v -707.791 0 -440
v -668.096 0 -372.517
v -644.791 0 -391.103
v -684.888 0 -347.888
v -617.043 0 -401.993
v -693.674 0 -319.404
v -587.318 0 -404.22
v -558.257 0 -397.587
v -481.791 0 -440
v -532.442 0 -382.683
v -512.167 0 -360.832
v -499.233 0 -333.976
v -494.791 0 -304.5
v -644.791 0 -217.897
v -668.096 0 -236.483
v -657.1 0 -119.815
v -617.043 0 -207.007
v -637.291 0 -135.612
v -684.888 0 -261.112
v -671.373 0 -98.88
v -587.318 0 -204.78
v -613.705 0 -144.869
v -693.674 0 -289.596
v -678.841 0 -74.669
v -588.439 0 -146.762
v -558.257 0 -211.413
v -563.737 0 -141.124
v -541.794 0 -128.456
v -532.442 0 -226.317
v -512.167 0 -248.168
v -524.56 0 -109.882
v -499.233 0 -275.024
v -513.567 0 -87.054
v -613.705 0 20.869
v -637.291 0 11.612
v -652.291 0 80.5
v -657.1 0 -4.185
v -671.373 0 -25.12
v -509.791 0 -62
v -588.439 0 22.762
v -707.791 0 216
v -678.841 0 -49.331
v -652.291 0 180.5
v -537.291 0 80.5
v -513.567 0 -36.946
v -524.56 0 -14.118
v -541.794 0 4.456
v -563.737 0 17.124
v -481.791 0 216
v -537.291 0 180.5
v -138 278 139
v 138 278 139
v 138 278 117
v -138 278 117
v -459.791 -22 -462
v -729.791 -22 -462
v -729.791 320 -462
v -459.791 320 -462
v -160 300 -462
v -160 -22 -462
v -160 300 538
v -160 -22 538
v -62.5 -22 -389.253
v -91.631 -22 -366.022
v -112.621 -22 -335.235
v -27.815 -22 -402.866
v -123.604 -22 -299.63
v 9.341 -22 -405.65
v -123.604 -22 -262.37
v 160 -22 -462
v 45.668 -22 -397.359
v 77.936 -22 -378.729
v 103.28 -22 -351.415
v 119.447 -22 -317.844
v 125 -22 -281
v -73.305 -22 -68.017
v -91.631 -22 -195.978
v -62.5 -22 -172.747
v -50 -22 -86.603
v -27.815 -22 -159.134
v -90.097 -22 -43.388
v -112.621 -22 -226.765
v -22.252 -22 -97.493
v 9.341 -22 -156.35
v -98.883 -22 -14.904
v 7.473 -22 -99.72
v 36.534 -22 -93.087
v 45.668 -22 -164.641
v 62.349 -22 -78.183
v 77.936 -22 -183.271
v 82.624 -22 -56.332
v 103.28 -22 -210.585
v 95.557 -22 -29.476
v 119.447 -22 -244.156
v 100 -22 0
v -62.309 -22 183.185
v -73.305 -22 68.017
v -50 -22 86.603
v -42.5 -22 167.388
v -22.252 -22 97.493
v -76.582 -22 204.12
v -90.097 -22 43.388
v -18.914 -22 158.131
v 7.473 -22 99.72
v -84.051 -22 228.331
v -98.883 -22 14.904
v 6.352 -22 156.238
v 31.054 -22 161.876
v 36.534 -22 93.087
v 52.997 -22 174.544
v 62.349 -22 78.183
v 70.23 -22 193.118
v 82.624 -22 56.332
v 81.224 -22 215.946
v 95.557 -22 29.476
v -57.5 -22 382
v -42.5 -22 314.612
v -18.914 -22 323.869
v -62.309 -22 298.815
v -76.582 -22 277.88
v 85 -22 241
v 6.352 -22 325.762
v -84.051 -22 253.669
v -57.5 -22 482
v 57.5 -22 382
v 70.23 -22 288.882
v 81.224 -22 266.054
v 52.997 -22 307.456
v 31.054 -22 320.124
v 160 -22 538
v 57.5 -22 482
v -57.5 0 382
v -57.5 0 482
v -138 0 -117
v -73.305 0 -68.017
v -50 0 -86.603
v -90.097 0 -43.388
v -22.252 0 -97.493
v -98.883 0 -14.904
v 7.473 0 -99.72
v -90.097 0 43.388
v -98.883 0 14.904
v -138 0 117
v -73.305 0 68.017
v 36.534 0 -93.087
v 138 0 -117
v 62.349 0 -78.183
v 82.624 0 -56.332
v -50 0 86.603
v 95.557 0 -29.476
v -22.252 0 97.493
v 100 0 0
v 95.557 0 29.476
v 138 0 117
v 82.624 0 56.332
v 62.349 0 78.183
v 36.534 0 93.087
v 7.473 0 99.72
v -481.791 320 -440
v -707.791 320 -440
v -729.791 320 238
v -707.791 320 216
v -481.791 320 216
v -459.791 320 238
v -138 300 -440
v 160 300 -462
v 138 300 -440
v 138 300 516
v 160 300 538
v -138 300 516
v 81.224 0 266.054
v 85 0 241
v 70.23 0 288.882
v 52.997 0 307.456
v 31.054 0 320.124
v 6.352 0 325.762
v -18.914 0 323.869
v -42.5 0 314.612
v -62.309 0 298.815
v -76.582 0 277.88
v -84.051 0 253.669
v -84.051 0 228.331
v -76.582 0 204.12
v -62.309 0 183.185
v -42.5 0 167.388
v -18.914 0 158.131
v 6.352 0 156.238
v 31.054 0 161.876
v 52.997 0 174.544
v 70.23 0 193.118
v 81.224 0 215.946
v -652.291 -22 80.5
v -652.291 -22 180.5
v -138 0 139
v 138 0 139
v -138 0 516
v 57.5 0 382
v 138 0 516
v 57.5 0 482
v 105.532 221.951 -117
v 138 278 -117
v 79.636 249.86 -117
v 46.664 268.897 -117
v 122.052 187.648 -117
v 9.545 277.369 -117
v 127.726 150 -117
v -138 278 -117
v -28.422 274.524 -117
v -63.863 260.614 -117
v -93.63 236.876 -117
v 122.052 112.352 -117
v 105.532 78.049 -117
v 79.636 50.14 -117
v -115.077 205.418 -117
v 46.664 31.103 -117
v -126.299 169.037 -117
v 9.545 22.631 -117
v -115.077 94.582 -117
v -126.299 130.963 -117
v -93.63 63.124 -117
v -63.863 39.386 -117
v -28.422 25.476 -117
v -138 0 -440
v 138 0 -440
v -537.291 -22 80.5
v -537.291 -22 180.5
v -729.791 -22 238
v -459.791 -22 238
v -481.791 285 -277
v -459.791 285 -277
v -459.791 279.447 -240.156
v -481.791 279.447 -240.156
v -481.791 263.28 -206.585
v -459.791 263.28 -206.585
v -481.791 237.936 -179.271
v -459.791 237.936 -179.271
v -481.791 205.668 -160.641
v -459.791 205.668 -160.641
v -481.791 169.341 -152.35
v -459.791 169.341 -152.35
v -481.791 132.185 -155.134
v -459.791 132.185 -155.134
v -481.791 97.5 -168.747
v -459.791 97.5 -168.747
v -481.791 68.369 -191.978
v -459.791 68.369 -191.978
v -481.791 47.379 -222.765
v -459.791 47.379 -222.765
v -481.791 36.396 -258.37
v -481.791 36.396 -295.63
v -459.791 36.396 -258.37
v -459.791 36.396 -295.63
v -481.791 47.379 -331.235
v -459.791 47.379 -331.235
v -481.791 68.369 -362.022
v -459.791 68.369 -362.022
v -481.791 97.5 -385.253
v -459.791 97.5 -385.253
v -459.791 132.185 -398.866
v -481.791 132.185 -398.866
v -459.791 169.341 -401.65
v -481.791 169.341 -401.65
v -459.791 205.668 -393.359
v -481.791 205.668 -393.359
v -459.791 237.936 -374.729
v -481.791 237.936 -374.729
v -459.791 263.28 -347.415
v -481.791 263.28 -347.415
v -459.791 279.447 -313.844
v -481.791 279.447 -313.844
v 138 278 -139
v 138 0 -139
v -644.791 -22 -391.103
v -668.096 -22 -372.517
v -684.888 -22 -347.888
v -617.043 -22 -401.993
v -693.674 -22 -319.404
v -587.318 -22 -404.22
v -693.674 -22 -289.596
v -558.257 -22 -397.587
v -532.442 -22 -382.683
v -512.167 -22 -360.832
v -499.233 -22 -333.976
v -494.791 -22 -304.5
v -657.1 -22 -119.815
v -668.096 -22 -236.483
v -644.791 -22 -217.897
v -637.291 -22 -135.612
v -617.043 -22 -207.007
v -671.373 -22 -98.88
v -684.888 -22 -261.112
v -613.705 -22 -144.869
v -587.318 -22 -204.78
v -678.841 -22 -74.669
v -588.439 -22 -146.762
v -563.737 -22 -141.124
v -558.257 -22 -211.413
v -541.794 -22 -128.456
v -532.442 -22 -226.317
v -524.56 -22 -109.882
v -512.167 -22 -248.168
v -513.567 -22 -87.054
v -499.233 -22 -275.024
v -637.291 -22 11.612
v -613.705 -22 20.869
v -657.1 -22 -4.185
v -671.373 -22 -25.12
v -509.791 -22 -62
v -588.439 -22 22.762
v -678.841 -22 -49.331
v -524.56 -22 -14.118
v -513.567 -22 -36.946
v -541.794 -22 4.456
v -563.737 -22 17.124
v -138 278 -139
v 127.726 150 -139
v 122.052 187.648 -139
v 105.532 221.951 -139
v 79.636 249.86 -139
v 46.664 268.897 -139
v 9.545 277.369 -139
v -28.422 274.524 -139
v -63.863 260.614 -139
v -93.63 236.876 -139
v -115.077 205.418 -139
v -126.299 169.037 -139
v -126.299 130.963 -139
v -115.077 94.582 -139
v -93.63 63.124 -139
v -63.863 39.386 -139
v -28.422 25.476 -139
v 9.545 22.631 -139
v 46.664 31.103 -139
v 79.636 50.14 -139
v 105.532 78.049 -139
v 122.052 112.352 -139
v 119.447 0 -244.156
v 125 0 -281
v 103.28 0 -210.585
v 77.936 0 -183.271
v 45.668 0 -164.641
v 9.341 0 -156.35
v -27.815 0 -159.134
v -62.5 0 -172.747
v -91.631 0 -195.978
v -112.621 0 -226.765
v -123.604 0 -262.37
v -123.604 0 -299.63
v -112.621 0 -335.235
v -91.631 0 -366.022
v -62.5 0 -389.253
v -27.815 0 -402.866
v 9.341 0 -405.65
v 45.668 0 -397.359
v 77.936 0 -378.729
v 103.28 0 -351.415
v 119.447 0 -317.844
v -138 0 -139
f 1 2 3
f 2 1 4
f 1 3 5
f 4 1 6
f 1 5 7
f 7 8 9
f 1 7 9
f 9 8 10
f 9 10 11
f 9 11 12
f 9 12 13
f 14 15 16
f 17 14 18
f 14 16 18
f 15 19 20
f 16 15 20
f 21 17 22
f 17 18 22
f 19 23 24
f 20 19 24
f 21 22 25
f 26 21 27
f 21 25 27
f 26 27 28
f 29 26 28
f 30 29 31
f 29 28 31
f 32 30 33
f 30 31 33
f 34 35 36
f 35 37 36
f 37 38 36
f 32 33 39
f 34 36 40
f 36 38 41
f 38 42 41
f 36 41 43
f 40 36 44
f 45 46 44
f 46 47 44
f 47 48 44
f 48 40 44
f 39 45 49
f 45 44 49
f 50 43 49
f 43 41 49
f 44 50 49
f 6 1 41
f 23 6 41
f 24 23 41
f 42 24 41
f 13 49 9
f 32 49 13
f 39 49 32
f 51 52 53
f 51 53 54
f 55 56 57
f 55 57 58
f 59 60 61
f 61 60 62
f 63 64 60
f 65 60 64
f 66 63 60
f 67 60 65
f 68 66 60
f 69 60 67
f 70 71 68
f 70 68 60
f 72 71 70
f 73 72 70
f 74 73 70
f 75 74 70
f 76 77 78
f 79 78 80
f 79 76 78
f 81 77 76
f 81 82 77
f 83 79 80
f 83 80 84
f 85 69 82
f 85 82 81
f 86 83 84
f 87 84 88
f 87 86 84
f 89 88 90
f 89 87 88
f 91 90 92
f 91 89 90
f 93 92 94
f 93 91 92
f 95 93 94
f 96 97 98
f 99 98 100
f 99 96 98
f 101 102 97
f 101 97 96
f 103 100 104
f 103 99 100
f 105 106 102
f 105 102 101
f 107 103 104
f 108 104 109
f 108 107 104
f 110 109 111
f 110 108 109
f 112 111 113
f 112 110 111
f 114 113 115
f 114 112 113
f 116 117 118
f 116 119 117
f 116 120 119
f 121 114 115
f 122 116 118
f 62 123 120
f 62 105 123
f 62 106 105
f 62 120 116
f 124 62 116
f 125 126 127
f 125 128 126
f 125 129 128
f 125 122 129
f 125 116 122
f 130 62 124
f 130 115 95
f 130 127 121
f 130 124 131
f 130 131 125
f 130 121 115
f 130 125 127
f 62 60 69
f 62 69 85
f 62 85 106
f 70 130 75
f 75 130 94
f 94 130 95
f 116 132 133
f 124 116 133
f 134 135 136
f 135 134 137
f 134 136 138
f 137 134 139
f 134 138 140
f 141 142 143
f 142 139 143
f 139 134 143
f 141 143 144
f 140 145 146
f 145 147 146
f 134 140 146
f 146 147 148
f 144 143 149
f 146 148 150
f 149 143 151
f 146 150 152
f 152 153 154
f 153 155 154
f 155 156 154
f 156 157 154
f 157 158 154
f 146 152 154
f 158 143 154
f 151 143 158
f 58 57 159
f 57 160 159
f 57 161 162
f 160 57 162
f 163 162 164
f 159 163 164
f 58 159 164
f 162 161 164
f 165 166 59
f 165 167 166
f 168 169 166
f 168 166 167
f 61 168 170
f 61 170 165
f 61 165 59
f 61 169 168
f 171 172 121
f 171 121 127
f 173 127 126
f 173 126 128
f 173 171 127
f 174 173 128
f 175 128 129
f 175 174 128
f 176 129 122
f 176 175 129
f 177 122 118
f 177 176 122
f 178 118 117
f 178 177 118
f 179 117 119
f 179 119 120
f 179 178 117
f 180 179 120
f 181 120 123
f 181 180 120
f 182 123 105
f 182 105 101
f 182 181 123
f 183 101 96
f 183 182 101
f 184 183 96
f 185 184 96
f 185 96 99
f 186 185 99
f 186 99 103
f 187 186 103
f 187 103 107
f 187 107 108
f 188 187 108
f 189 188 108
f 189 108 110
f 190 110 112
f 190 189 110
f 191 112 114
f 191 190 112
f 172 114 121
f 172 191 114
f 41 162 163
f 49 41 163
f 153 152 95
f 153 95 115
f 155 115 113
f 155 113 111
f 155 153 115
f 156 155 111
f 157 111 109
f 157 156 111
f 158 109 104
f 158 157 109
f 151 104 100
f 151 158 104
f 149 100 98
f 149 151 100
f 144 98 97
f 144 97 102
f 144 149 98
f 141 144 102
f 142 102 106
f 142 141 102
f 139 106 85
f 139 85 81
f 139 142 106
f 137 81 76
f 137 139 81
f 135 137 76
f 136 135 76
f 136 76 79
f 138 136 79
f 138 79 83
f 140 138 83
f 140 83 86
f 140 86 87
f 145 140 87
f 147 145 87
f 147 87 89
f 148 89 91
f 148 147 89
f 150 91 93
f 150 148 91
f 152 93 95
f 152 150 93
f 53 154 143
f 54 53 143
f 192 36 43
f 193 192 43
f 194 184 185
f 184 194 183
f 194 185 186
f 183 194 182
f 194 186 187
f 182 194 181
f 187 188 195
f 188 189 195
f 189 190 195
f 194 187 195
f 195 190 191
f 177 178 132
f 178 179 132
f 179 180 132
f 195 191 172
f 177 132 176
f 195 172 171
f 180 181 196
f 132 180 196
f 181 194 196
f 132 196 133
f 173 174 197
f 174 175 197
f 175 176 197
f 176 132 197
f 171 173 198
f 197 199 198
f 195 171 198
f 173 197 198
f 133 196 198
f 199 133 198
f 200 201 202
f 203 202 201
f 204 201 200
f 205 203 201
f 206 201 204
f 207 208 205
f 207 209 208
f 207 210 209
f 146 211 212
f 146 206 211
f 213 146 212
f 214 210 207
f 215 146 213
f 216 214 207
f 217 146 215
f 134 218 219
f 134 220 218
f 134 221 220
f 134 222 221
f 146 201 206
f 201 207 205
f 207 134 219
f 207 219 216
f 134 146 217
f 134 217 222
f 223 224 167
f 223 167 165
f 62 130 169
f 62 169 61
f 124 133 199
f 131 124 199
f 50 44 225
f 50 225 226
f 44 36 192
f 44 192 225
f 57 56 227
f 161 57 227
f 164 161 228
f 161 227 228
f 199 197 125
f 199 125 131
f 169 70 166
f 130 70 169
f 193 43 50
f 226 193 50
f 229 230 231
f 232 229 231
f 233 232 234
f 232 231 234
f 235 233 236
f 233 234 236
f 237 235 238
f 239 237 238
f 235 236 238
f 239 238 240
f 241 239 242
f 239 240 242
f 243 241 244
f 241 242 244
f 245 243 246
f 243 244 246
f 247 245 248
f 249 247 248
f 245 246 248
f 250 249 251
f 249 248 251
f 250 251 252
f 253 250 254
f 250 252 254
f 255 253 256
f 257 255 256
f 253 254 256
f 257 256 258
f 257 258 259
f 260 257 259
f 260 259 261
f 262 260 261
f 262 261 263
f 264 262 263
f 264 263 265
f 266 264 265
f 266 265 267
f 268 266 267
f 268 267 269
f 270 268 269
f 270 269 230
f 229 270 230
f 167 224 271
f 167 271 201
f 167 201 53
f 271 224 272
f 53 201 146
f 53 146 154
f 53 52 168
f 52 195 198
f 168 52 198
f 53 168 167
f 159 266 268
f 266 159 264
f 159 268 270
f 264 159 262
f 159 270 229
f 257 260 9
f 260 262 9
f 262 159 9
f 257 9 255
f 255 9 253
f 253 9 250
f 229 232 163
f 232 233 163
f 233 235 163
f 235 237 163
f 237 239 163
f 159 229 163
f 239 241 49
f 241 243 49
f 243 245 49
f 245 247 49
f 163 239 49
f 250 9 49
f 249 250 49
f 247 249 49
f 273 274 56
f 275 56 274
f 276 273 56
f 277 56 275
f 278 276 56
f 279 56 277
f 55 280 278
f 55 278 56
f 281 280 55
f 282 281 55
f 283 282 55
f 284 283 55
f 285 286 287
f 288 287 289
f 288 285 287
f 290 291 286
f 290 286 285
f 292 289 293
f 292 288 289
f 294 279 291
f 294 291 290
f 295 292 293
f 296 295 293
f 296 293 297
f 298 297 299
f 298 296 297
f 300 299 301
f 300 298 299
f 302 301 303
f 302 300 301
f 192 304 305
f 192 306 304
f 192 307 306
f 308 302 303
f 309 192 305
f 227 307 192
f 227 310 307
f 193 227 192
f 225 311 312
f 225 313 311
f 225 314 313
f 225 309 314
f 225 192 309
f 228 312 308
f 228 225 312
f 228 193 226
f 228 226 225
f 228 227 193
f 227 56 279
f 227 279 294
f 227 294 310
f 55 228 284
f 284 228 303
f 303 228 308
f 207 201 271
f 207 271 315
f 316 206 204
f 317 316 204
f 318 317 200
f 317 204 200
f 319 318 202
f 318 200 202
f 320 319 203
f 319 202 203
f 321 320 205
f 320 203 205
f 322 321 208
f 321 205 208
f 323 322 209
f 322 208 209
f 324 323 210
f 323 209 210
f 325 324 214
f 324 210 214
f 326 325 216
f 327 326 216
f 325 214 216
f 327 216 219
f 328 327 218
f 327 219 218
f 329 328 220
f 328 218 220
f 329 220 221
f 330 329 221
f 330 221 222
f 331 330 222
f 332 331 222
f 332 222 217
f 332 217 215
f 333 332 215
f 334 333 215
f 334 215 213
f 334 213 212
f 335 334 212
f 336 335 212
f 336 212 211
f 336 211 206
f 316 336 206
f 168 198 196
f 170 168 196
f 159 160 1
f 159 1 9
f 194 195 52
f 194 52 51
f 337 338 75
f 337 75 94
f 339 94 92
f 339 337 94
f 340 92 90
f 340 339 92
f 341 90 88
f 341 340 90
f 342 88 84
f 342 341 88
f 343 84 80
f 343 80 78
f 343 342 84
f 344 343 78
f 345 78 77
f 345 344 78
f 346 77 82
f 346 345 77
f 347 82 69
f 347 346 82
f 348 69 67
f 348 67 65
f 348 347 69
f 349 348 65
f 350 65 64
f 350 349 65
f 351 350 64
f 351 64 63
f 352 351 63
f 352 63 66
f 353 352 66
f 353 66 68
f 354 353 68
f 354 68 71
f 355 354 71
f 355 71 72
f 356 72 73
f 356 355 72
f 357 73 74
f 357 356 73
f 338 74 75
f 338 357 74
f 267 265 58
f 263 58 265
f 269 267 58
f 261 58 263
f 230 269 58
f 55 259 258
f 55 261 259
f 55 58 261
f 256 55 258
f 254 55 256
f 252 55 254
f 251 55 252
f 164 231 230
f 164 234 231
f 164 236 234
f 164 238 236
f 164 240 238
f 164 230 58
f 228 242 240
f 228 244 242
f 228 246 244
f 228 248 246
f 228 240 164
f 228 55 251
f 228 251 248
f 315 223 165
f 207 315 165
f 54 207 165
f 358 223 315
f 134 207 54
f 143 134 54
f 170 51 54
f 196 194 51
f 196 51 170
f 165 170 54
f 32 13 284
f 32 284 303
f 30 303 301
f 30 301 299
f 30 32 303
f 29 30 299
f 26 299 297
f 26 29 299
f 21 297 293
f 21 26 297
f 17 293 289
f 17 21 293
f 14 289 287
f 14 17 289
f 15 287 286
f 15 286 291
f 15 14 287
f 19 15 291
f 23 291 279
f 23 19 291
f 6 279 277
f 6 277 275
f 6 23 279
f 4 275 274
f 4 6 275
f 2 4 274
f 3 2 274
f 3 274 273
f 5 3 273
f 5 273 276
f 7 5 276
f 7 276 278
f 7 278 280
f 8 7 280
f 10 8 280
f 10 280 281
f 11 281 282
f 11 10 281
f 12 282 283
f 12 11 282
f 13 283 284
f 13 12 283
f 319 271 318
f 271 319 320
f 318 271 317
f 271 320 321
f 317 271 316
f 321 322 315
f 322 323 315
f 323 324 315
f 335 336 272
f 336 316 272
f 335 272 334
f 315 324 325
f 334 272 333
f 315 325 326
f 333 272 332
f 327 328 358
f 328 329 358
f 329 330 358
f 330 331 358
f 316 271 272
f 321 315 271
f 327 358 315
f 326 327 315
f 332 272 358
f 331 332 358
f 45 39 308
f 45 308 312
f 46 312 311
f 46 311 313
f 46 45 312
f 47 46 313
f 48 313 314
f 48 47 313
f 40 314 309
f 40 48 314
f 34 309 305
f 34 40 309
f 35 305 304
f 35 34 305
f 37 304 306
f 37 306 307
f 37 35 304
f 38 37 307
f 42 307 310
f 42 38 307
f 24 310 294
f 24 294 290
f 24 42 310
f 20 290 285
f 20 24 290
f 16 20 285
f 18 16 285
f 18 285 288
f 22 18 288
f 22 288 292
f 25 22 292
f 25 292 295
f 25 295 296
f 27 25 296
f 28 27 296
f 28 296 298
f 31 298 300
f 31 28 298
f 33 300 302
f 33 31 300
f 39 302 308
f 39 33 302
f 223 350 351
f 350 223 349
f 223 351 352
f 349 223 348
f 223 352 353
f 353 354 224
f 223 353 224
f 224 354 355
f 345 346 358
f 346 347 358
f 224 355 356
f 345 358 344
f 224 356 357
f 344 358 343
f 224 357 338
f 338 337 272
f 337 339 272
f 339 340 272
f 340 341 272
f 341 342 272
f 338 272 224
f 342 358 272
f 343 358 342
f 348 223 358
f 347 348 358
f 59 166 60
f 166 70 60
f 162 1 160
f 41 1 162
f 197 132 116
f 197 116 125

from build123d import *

# Parameters (mm, degrees)
F0_W      = 320
F0_H      = 1000
F0_R      = 125
F0_R_2    = 100
F0_R_3    = 85
F0_W_2    = 115
F0_H_2    = 100
F1_DEPTH  = 22
F0_W_3    = 270
F0_H_3    = 700
F4_DEPTH  = 320
F3_W      = 225.9999704361
F3_H      = 655.9999704361
F5_DEPTH  = 824
F2_W      = 320
F2_H      = 1000
F2_W_2    = 276
F2_H_2    = 956
F6_DEPTH  = 300
F7_R      = 125
F8_DEPTH  = 25
F9_W      = 276
F9_H      = 22
F10_DEPTH = 278
F11_R     = 127.7260322989
F12_DEPTH = 25


with BuildPart() as f1:
    # F0 (on Front) → F1 (new body)
    with BuildSketch(Plane.XZ):
        with Locations((0, 38)):
            Rectangle(F0_W, F0_H)
        with Locations((0, -281)):
            Circle(F0_R, mode=Mode.SUBTRACT)
        Circle(F0_R_2, mode=Mode.SUBTRACT)
        with Locations((0, 241)):
            Circle(F0_R_3, mode=Mode.SUBTRACT)
        with Locations((0, 432)):
            Rectangle(F0_W_2, F0_H_2, mode=Mode.SUBTRACT)
    extrude(amount=F1_DEPTH)

    # F2 (on face) → F6 (join)
    with BuildSketch(Plane(origin=(0, 0, 0), x_dir=(-1, 0, 0), z_dir=(0, 1, 0))):
        with Locations((0, 38)):
            Rectangle(F2_W, F2_H)
        with Locations((0, 38)):
            Rectangle(F2_W_2, F2_H_2, mode=Mode.SUBTRACT)
    extrude(amount=F6_DEPTH)

    # F9 (on face) → F10 (join)
    with BuildSketch(Plane(origin=(0, 0, 0), x_dir=(-1, 0, 0), z_dir=(0, 1, 0))):
        with Locations((0, -128)):
            Rectangle(F9_W, F9_H)
        with Locations((0, 128)):
            Rectangle(F9_W, F9_H)
    extrude(amount=F10_DEPTH)

    # F11 (on face) → F12 (cut)
    with BuildSketch(Plane.XY.offset(-117)):
        with Locations((0, 150)):
            Circle(F11_R)
    extrude(amount=-F12_DEPTH, mode=Mode.SUBTRACT)


with BuildPart() as f1b:
    # F0 (on Front) → F1, piece 2 (new body)
    with BuildSketch(Plane.XZ):
        with Locations((-594.7907733917, -112)):
            Rectangle(F0_W_3, F0_H_3)
        with Locations((-594.7907733917, -304.5)):
            Circle(F0_R_2, mode=Mode.SUBTRACT)
        with Locations((-594.7907733917, -62)):
            Circle(F0_R_3, mode=Mode.SUBTRACT)
        with Locations((-594.7907733917, 130.5)):
            Rectangle(F0_W_2, F0_H_2, mode=Mode.SUBTRACT)
    extrude(amount=F1_DEPTH)

    # F4 (add): a face of the model
    f4_faces = [f1b.faces().sort_by_distance(p)[0] for p in [
        (-594.7907733917, 0, 230.4973338072),
    ]]
    extrude(f4_faces, amount=F4_DEPTH)

    # F3 (on Front) → F5 (cut)
    with BuildSketch(Plane.XZ):
        with Locations((-594.7907733917, -112)):
            Rectangle(F3_W, F3_H)
    extrude(amount=-F5_DEPTH, mode=Mode.SUBTRACT)

    # F7 (on face) → F8 (cut)
    with BuildSketch(Plane.YZ.offset(-459.7907733917)):
        with Locations((160, -277)):
            Circle(F7_R)
    extrude(amount=-F8_DEPTH, mode=Mode.SUBTRACT)


solid = Compound([f1.part, f1b.part])
